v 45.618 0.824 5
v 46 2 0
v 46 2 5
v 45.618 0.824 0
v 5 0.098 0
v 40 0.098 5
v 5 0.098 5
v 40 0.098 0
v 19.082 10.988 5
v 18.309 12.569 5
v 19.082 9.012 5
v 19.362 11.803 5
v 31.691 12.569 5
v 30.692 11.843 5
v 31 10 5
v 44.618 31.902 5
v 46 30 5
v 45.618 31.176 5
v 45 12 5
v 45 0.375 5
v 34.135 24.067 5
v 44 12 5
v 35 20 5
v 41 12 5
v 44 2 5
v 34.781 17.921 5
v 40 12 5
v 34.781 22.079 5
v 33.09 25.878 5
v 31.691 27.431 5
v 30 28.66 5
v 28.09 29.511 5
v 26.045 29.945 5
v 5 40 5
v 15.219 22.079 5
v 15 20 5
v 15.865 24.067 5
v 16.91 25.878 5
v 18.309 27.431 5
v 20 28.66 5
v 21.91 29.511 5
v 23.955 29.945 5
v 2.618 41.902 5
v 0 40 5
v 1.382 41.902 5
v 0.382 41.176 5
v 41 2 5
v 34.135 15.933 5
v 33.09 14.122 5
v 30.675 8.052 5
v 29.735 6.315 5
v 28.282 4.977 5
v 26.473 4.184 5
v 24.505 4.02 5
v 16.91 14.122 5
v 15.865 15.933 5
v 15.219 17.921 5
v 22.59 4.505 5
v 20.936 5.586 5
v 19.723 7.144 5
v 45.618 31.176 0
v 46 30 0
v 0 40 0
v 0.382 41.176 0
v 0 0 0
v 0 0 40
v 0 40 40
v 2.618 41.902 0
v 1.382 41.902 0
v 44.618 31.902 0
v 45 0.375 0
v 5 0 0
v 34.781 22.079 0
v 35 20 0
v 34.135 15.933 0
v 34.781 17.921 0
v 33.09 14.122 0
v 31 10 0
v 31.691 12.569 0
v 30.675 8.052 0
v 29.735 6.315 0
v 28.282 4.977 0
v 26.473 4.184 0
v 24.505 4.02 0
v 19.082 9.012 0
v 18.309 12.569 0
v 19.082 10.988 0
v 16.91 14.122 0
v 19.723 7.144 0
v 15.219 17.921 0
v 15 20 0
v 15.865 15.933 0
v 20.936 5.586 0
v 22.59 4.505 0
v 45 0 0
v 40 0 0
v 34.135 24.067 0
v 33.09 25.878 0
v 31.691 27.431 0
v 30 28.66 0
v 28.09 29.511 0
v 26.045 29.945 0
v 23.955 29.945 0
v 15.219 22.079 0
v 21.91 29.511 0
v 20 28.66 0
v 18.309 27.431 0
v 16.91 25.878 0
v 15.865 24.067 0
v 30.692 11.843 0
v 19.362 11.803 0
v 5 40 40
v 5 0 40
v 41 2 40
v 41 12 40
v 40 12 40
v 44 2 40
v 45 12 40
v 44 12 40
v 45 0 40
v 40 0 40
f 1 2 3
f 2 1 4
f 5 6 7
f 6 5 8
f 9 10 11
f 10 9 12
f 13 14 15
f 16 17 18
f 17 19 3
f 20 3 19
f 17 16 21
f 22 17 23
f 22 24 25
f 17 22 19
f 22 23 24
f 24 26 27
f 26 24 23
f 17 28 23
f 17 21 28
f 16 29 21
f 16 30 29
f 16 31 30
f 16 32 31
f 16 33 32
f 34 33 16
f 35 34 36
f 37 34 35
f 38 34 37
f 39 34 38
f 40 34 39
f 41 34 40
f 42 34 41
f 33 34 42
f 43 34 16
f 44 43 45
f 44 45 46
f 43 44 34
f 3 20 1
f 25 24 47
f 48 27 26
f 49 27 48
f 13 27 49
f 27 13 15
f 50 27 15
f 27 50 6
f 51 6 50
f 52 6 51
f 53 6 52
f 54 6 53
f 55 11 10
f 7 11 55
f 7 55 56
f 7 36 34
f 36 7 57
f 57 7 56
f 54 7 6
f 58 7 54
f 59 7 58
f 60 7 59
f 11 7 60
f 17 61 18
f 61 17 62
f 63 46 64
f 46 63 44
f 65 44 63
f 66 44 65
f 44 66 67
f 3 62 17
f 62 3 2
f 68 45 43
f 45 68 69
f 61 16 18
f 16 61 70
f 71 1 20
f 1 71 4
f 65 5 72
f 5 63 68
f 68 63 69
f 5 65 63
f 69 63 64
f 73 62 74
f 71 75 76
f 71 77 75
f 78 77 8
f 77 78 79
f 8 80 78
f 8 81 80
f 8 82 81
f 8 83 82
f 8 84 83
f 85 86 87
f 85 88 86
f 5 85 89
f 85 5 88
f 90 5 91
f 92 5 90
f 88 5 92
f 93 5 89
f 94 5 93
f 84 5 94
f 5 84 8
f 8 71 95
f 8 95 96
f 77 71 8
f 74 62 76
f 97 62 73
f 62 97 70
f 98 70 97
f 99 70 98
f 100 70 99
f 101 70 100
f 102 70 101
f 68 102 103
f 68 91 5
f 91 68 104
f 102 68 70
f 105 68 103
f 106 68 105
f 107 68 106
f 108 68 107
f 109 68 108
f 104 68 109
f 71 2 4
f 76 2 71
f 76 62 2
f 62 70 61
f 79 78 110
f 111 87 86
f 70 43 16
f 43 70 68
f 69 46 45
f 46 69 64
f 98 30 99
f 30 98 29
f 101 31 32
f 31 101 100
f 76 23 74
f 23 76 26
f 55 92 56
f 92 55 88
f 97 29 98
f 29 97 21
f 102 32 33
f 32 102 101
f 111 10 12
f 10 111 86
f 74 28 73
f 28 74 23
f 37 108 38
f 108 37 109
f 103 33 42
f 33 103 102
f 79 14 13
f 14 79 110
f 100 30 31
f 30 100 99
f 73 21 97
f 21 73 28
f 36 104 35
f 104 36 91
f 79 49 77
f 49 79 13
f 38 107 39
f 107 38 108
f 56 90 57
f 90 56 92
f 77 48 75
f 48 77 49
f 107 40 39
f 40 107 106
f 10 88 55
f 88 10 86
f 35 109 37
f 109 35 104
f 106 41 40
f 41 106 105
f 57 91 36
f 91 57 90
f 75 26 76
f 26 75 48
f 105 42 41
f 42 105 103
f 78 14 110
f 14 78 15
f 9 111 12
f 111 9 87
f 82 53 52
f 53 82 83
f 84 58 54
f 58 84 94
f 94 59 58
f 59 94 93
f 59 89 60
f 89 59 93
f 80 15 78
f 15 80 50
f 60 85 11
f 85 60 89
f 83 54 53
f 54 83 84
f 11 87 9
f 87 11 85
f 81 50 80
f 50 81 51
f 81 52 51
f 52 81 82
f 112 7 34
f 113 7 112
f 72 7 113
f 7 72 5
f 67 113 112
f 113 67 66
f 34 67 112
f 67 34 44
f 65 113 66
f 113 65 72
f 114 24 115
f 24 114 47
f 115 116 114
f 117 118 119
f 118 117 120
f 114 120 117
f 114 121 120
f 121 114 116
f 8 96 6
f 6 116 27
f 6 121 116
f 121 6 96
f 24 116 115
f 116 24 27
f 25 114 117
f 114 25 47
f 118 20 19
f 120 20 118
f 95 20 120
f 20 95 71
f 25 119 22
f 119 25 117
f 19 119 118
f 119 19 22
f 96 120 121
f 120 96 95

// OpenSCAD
difference()
{
    hull()
    {
        $fn = 10;
        translate([2, 2, 0]) cylinder(5, 2, 2);
        translate([44, 2, 0]) cylinder(5, 2, 2);
        translate([44, 30, 0]) cylinder(5, 2, 2);
        translate([2, 40,  0]) cylinder(5, 2, 2);
    }

    translate([25, 20, -5]) cylinder(15, 10, 10);
    translate([25, 10, -5]) cylinder(15, 6, 6);
}

cube([5, 40, 40]);

translate([40, 2, 0]) cube([1, 10, 40]);
translate([44, 2, 0]) cube([1, 10, 40]);
translate([40, 0, 0]) cube([5, 2, 40]);
